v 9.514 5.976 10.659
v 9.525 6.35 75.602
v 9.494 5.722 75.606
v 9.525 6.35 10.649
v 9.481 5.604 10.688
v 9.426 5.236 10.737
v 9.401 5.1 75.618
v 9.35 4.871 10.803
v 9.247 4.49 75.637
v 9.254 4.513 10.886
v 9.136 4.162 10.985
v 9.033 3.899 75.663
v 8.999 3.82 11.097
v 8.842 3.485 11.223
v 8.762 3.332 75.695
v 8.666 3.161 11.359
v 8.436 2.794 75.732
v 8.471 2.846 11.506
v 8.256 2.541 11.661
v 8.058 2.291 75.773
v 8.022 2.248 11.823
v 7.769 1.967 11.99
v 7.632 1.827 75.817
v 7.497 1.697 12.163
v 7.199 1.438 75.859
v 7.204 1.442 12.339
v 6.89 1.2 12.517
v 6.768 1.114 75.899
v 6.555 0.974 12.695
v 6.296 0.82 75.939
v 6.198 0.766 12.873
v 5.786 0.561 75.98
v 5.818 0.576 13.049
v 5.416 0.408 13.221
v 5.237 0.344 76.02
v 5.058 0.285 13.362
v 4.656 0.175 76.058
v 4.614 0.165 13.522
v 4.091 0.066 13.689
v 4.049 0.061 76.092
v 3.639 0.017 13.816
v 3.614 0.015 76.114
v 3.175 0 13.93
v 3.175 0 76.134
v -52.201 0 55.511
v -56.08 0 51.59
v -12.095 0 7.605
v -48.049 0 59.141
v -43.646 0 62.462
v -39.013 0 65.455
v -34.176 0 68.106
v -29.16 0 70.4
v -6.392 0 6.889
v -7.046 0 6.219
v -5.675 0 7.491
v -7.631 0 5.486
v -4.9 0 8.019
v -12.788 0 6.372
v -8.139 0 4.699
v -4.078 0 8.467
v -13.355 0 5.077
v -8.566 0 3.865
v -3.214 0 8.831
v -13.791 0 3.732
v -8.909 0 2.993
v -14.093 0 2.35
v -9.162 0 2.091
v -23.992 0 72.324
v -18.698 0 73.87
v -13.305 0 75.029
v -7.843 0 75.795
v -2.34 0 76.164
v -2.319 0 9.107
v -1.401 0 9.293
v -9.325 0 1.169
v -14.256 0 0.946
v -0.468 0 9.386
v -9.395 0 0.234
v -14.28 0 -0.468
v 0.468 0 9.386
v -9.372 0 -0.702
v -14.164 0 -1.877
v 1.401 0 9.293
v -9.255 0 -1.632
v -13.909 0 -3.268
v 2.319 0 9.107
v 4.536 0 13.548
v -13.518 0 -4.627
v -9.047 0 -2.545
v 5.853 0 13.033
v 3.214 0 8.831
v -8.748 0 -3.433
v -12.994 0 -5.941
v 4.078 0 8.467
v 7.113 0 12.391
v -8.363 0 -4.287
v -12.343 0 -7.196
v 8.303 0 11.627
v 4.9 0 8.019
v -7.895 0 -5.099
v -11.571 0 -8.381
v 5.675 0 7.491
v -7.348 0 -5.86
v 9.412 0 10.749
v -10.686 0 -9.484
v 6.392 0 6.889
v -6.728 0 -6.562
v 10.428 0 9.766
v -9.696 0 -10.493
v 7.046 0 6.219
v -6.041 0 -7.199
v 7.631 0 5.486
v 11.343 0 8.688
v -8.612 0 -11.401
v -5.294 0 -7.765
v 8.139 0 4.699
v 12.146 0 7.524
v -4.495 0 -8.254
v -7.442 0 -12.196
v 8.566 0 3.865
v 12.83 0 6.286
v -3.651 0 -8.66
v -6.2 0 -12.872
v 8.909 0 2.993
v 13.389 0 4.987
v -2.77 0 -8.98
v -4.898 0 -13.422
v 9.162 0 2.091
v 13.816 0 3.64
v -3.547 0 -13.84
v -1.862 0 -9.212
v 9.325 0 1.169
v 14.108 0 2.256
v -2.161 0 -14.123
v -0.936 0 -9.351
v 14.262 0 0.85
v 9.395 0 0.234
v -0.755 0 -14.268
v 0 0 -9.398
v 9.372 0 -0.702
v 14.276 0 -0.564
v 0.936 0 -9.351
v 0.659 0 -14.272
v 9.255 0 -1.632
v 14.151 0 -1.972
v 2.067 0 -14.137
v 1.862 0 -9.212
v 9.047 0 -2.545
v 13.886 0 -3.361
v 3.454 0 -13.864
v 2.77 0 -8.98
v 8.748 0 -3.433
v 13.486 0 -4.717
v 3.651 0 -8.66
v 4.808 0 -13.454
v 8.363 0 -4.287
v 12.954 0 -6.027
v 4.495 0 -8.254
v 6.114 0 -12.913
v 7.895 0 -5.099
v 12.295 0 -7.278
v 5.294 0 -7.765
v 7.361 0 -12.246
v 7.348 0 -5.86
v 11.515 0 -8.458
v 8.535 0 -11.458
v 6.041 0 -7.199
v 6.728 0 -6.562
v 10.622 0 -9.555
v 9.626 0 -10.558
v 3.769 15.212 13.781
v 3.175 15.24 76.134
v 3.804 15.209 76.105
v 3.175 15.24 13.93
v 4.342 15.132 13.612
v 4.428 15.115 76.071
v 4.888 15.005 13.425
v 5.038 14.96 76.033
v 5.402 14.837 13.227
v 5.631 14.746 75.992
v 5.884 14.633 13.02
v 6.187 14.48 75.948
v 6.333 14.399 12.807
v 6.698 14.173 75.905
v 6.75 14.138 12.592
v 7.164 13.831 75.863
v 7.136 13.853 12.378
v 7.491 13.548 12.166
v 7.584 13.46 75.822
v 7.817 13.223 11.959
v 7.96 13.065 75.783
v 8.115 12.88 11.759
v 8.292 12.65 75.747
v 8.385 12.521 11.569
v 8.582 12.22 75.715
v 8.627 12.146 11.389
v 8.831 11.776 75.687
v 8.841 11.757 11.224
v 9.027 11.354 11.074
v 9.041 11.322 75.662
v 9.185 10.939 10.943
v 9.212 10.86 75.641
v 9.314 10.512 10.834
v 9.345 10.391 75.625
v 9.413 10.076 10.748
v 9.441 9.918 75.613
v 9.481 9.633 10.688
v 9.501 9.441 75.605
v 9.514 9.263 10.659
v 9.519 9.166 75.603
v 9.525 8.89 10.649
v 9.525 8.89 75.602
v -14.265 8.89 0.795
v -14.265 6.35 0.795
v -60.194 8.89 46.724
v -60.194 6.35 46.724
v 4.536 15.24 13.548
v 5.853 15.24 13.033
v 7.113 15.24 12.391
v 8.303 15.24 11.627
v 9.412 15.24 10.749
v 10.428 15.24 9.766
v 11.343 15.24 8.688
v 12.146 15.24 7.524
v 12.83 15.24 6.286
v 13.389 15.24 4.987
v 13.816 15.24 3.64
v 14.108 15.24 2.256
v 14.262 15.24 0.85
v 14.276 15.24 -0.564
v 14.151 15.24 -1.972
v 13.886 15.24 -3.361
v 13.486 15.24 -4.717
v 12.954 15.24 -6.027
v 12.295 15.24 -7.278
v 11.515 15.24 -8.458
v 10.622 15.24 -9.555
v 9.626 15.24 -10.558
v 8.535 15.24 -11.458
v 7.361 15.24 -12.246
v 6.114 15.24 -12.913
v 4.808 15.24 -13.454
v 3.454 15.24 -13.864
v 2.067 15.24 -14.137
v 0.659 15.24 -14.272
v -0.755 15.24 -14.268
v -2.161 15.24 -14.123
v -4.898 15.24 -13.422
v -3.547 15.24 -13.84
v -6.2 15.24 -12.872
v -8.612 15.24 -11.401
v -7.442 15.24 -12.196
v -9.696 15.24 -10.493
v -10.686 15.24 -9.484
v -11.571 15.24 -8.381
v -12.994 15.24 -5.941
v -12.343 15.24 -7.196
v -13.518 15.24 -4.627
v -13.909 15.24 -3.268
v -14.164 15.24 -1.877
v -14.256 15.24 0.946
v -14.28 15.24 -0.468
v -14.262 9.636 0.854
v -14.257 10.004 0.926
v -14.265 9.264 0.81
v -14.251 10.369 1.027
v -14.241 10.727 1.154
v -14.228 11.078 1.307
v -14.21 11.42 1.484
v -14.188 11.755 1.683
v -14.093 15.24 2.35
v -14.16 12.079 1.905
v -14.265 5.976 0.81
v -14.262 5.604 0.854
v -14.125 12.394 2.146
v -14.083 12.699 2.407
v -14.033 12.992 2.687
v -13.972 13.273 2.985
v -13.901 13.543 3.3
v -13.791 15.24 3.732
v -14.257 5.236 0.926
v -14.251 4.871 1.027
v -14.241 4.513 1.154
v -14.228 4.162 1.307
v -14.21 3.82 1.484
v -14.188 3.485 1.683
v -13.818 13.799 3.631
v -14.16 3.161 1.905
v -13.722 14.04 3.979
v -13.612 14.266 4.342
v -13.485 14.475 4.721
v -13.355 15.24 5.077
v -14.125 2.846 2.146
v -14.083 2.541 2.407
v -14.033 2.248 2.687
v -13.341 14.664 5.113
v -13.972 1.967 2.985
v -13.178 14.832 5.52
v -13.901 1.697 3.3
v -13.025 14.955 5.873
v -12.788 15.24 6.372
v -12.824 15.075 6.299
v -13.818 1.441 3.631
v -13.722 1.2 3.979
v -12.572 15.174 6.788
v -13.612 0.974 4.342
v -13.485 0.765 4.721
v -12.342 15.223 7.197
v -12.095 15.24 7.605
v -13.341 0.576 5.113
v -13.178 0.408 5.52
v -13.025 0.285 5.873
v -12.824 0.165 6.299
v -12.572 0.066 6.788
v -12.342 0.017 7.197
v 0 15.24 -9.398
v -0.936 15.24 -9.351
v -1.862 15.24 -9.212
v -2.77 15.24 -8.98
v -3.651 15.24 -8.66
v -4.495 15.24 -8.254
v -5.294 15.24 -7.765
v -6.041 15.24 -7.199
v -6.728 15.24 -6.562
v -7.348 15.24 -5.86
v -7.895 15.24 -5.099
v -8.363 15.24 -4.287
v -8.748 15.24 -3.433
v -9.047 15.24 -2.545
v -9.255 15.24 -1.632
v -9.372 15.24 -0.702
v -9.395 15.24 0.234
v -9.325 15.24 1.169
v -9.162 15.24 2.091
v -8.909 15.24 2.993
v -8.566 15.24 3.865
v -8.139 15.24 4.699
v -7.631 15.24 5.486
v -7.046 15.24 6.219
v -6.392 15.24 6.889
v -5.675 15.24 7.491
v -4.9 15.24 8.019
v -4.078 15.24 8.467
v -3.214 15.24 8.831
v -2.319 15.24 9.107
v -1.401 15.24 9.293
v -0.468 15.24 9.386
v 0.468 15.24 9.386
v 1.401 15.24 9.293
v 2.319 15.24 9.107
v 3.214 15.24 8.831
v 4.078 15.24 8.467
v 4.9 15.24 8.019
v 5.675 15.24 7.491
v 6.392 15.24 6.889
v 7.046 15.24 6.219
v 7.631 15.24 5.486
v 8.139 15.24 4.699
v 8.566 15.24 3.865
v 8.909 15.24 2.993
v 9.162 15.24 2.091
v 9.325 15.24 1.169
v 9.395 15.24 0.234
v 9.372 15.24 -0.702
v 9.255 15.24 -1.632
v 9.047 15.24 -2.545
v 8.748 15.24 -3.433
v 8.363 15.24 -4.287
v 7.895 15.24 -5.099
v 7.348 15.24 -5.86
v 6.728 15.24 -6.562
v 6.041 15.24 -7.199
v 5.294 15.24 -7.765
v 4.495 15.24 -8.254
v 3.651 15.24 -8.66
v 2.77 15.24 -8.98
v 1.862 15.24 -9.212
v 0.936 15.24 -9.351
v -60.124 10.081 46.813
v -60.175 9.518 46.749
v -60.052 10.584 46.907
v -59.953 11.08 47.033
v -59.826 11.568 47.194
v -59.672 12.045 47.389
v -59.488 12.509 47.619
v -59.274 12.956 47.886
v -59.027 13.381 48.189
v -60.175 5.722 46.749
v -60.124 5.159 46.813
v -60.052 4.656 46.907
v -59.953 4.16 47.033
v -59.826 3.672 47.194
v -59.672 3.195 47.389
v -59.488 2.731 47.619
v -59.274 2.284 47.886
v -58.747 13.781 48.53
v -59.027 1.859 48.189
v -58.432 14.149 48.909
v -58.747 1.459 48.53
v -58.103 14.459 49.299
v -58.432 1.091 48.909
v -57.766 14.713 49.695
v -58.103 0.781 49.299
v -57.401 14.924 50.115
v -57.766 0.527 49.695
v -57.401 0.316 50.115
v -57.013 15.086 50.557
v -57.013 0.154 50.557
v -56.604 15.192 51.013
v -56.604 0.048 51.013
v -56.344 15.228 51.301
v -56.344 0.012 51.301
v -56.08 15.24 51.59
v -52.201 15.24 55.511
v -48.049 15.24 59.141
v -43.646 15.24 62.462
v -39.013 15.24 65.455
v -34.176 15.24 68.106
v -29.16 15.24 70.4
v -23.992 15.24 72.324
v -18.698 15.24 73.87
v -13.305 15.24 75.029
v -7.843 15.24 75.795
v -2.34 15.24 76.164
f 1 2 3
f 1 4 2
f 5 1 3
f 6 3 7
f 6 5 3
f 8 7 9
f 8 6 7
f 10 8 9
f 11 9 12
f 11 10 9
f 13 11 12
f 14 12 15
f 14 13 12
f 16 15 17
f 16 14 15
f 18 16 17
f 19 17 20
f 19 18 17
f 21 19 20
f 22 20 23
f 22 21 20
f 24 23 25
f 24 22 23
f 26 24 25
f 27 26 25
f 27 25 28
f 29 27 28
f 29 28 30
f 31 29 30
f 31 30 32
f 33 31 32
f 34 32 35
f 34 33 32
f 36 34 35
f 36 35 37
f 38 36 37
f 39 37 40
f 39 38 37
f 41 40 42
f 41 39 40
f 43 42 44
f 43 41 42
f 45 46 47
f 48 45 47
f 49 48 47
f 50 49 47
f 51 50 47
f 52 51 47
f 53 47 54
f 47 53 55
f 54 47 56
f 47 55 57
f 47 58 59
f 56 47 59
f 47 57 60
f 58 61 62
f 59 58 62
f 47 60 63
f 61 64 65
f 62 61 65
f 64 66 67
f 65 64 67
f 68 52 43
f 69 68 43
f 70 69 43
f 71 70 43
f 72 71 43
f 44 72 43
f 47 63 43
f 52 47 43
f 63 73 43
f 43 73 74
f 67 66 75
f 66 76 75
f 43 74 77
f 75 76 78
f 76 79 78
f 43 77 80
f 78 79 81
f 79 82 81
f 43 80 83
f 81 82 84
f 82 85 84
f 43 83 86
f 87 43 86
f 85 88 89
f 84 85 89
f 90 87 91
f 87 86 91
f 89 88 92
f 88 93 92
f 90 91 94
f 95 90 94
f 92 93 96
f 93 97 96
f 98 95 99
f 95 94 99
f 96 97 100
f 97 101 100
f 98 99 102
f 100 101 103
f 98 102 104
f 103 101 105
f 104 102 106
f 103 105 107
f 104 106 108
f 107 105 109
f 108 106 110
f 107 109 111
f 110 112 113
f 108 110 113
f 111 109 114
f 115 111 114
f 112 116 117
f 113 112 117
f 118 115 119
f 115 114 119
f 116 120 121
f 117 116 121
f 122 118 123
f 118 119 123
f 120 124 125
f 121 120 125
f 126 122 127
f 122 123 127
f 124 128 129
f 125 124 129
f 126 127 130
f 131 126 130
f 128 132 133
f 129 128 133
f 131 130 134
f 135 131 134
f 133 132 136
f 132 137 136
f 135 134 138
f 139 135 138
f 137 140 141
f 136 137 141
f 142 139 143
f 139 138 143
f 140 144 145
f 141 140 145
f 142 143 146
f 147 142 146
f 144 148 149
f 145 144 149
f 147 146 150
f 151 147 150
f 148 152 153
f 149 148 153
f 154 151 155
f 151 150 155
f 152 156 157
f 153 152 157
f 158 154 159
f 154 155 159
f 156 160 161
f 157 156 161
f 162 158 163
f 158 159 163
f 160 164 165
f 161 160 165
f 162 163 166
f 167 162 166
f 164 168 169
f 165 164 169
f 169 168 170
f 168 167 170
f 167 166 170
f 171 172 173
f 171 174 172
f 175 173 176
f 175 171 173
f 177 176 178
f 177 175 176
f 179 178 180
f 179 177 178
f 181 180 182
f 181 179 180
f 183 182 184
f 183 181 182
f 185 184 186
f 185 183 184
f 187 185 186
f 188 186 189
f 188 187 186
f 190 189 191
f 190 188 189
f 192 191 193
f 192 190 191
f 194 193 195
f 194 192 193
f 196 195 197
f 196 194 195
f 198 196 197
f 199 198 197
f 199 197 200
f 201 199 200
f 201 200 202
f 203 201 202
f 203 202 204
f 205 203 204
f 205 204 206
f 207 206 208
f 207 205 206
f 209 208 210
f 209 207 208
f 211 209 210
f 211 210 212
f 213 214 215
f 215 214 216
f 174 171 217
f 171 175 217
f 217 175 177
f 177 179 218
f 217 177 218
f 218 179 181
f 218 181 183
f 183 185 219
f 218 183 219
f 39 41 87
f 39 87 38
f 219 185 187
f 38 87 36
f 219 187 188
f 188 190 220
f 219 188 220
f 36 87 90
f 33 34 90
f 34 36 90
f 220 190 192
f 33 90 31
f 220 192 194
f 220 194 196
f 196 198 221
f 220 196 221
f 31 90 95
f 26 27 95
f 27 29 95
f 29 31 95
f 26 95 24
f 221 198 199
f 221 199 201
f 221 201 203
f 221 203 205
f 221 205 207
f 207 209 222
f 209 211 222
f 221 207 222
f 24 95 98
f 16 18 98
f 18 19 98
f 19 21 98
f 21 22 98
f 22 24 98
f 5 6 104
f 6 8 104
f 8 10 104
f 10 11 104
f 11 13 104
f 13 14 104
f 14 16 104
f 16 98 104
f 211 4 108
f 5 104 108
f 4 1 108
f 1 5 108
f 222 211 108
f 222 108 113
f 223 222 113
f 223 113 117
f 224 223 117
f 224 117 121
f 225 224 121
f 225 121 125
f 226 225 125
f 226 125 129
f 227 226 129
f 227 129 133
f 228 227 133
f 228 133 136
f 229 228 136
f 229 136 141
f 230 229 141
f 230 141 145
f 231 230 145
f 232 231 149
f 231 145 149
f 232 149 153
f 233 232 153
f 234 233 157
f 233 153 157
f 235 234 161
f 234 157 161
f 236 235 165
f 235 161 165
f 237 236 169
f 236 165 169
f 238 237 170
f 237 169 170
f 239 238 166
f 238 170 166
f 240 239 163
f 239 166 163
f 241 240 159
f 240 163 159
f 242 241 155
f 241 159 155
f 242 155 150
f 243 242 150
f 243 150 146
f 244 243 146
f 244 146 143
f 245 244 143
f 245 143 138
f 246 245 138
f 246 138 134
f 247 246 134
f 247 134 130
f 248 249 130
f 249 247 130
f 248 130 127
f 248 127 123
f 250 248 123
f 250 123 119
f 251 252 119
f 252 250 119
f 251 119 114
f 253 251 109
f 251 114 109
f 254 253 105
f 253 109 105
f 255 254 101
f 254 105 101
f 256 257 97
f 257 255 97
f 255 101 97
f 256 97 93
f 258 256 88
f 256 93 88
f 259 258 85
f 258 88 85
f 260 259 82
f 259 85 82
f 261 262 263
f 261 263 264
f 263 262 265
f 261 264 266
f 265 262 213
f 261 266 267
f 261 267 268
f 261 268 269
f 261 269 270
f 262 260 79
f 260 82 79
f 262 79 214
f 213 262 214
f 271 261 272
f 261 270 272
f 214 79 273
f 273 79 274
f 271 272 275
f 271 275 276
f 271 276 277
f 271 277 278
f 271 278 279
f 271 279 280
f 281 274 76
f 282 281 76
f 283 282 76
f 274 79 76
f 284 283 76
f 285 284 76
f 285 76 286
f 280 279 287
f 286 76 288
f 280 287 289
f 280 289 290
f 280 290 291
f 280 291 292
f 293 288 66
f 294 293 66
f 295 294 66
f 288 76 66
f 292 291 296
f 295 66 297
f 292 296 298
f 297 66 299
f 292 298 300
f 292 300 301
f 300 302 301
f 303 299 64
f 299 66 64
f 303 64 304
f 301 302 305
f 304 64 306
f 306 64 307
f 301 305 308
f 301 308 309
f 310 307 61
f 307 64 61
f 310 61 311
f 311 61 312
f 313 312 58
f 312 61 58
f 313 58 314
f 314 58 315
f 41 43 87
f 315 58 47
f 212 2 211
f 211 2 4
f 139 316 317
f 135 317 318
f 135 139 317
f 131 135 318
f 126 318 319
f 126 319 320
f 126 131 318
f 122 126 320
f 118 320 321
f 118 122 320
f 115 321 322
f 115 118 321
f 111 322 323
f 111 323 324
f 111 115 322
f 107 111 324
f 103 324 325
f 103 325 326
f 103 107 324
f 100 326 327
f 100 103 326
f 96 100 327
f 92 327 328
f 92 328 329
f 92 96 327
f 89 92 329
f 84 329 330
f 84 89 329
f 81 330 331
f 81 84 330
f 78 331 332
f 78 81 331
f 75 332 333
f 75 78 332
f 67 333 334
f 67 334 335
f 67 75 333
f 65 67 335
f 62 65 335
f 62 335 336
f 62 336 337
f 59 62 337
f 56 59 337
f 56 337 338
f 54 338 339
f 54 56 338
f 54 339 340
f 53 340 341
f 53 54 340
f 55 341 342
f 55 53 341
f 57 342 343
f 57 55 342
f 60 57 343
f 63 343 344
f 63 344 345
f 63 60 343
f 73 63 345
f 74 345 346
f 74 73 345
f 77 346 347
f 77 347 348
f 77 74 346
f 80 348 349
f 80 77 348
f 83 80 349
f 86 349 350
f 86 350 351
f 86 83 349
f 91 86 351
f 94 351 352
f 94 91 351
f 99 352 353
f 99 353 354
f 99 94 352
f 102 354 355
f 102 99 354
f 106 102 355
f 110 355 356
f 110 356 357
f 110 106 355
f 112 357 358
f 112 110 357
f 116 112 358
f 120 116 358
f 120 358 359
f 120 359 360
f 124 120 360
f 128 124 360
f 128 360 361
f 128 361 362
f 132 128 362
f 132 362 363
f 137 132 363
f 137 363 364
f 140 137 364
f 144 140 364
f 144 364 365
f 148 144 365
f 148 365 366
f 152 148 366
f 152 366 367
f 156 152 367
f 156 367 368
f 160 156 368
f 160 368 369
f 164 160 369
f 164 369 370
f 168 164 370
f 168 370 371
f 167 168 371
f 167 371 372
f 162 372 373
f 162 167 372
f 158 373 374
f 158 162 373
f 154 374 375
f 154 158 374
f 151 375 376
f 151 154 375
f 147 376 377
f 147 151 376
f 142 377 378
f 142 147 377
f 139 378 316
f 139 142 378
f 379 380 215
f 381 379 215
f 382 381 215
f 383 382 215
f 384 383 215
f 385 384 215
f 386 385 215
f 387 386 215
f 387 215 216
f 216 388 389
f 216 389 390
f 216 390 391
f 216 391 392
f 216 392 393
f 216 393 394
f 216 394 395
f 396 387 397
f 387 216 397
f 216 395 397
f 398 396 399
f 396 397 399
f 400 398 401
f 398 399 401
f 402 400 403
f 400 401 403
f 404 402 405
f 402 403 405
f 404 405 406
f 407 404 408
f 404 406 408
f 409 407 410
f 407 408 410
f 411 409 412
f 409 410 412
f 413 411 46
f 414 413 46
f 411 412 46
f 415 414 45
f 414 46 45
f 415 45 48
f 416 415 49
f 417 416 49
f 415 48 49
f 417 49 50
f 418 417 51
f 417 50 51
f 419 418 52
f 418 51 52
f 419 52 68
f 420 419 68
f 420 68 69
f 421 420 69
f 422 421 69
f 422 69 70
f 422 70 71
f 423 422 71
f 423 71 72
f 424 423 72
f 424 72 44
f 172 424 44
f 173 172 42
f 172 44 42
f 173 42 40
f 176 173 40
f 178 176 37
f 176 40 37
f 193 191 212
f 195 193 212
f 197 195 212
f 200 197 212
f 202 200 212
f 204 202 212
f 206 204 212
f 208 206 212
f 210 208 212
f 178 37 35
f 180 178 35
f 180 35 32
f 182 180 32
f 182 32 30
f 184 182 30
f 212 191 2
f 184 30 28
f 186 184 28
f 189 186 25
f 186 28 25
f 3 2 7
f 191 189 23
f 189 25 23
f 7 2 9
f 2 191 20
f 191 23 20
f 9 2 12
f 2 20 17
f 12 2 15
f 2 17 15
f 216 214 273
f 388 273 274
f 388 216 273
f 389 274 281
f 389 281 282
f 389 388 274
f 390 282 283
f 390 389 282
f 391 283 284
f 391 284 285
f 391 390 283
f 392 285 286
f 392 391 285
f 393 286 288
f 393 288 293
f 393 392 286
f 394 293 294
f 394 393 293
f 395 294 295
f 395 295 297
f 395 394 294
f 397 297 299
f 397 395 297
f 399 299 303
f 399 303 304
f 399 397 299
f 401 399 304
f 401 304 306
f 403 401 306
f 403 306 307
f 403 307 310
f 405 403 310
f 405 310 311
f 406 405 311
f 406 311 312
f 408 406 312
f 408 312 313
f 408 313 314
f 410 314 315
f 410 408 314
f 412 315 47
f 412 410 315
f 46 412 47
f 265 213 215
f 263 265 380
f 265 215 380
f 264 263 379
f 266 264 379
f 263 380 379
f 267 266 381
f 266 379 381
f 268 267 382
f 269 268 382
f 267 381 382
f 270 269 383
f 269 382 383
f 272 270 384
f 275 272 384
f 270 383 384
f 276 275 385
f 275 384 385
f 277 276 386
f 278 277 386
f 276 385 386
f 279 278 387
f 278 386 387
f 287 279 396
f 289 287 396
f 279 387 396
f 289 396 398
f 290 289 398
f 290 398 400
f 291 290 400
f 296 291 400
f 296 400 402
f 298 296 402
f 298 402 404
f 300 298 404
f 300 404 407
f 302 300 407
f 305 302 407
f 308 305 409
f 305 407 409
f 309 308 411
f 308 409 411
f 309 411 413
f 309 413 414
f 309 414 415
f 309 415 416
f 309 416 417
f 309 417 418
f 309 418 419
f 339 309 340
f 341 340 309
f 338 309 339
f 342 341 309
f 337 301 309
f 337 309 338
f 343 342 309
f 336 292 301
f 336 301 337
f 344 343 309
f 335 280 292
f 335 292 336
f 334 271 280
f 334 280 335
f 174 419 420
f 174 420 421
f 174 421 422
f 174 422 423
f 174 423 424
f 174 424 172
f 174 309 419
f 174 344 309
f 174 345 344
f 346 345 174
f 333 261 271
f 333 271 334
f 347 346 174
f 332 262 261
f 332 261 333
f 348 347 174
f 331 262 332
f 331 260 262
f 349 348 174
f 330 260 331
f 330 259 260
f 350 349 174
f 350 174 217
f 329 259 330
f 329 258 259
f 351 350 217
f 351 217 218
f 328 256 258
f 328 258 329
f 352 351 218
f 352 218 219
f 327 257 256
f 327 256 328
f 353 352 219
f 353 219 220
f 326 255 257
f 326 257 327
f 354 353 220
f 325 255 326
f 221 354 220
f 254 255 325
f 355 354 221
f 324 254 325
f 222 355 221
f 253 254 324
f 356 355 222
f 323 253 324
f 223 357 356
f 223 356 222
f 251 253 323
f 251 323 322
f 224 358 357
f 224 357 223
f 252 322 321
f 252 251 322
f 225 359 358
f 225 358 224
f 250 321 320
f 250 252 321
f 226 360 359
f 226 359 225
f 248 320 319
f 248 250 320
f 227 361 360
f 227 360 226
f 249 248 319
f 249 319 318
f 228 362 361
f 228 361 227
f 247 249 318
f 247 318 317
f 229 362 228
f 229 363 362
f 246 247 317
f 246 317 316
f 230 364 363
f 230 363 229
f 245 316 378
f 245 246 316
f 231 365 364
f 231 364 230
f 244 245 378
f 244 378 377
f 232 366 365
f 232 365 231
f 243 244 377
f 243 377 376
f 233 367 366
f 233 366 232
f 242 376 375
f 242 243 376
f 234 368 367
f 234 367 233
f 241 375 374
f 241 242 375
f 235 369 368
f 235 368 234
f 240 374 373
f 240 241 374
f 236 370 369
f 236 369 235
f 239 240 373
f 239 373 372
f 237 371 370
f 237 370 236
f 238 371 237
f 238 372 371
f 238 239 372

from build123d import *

# Parameters (mm, degrees)
SKETCH1_R           = 14.2875
SKETCH1_R_2         = 9.398
BOSS_EXTRUDE2_DEPTH = 15.24
FILLET1_R           = 6.35


with BuildPart() as part:
    # Sketch1 → Boss-Extrude2 (new body)
    # profile 1 of 2: a face of its own
    with BuildSketch(Plane(origin=(0, 0, 0), x_dir=(1, 0, 0), z_dir=(0, 1, 0))):
        with BuildLine():
            ThreePointArc((9.525, -10.649273743), (-5.46758954, -13.199928821), (-14.265365769, -0.794981587))
            Line((-14.265365769, -0.794981587), (-60.194122004, -46.723737823))
            ThreePointArc((-60.194122004, -46.723737823), (-29.160477546, -70.399620377), (9.525, -75.602343714))
            Line((9.525, -75.602343714), (9.525, -10.649273743))
        make_face()
    # profile 2 of 2: a face of its own
    with BuildSketch(Plane(origin=(0, 0, 0), x_dir=(1, 0, 0), z_dir=(0, 1, 0))):
        Circle(SKETCH1_R)
        with Locations(Location((0, 0, 0), (0, 0, 90))):
            Circle(SKETCH1_R_2, mode=Mode.SUBTRACT)
    extrude(amount=BOSS_EXTRUDE2_DEPTH)

    # Fillet1
    fillet1_edges = [part.edges().sort_by_distance(p)[0] for p in [
        (9.525, 15.24, 43.125808728),
        (-37.229743887, 15.24, 23.759359705),
        (9.525, 0, 43.125808728),
        (-37.229743887, 0, 23.759359705),
    ]]
    fillet(fillet1_edges, radius=FILLET1_R)


solid = part.part
